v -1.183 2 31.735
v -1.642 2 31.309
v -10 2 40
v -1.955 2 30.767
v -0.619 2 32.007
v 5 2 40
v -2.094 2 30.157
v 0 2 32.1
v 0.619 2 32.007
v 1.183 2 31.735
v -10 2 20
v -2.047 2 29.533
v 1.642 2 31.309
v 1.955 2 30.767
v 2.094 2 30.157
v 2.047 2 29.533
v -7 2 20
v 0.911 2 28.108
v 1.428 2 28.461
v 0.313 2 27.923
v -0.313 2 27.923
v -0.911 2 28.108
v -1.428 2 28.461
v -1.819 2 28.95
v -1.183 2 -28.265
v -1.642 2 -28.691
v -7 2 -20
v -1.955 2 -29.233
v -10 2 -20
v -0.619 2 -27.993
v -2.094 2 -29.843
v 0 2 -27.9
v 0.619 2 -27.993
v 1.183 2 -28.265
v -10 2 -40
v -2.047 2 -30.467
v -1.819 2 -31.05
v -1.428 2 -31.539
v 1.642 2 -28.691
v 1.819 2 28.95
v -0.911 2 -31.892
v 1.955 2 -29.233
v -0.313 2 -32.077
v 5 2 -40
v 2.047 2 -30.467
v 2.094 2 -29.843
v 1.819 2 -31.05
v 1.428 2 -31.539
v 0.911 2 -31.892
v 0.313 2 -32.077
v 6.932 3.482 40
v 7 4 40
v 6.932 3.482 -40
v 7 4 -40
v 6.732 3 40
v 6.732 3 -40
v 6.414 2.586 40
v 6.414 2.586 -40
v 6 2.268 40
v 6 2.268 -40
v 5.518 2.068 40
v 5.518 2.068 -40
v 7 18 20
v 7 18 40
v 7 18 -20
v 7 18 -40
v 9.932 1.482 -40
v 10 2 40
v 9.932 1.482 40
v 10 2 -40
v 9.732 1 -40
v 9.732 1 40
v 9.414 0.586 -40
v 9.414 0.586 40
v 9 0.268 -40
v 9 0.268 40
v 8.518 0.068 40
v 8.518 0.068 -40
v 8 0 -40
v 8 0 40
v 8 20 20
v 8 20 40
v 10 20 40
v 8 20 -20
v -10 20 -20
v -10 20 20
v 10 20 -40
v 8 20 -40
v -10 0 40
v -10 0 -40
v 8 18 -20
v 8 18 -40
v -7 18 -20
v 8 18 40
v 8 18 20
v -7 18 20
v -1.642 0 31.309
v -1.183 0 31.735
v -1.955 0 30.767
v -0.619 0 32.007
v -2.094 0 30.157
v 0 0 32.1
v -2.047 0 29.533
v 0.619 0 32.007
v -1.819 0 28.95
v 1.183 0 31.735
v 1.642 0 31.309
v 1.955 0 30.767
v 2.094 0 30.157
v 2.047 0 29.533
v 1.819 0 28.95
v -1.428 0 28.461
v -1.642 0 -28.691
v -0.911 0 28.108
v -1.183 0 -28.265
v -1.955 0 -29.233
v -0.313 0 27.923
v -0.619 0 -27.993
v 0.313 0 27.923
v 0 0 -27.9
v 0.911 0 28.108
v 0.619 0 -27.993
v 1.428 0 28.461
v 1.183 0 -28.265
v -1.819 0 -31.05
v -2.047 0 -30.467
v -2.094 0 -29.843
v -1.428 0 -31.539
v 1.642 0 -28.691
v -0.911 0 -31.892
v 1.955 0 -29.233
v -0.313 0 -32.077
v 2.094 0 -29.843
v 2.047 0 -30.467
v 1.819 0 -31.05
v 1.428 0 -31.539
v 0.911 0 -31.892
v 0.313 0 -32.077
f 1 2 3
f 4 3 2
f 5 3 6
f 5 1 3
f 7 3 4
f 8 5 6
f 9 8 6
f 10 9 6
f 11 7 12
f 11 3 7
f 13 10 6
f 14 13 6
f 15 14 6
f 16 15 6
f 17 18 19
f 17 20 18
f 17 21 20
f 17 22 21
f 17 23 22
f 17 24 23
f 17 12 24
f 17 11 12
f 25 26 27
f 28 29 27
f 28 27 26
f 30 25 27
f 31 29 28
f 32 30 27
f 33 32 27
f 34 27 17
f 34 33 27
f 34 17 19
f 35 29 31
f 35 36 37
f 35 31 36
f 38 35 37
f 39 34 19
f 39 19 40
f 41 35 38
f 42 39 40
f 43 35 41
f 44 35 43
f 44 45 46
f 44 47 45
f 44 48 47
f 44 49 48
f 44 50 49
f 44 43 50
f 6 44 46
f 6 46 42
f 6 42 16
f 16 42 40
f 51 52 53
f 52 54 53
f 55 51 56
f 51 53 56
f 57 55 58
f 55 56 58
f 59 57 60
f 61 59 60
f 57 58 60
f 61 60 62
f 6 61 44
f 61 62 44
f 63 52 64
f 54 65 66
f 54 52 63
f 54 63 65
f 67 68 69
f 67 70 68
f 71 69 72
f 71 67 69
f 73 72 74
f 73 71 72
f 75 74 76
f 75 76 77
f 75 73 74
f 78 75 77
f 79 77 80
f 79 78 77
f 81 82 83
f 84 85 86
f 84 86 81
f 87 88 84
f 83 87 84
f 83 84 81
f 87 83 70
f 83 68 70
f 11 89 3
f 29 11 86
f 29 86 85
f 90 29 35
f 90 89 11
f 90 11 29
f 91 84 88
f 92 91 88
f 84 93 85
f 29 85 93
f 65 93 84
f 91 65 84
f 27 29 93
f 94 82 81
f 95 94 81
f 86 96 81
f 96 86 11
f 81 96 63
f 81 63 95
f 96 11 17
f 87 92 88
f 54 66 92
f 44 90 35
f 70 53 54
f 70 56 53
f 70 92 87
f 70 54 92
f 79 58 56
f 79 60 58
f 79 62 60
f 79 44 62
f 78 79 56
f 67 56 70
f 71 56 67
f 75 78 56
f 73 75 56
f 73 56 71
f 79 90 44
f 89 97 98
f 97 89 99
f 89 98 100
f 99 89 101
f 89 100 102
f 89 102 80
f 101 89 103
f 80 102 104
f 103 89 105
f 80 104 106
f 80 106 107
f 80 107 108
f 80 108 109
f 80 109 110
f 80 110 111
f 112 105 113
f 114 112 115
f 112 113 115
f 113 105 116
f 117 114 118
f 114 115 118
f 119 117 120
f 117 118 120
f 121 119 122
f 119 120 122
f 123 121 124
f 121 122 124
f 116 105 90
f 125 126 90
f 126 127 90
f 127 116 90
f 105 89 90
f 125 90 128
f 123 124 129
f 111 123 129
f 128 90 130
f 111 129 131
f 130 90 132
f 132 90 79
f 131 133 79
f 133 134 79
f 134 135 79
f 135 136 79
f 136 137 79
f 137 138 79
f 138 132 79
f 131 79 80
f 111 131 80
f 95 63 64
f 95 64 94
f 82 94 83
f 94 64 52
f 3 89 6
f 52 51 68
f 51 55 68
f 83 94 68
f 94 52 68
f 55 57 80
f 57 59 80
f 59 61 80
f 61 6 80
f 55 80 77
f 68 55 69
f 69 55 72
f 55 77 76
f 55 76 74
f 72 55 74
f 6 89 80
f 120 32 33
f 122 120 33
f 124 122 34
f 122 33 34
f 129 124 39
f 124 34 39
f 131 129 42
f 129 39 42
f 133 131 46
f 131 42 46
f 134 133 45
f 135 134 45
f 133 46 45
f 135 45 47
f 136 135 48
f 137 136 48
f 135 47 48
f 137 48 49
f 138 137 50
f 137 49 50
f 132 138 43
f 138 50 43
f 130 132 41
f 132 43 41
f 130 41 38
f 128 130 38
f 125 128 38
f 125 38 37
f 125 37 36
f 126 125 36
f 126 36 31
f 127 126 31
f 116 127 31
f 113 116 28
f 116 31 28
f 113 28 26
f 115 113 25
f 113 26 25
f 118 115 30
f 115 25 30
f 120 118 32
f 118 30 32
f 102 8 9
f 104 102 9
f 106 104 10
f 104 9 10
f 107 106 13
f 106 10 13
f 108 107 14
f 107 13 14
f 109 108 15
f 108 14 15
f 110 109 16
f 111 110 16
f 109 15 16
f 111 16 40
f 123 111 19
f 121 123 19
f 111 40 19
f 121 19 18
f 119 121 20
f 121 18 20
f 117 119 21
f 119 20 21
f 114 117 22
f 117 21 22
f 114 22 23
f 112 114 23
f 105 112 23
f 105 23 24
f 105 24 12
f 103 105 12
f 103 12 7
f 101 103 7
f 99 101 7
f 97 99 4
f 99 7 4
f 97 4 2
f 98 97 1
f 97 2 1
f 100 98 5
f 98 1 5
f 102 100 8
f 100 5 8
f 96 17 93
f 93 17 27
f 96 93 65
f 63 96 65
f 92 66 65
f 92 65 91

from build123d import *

# Parameters (mm, degrees)
CROQUIS1_W              = 20
CROQUIS1_H              = 80
SALIENTE_EXTRUIR1_DEPTH = 2
CROQUIS2_W              = 3
CROQUIS2_H              = 80
SALIENTE_EXTRUIR2_DEPTH = 16
REDONDEO1_R             = 2
REDONDEO2_R             = 2
CROQUIS3_W              = 20
CROQUIS3_H              = 80
SALIENTE_EXTRUIR3_DEPTH = 2
CROQUIS5_R              = 2.1
CORTAR_EXTRUIR1_DEPTH   = 2
CROQUIS6_W              = 18
CROQUIS6_H              = 20
CORTAR_EXTRUIR3_DEPTH   = 2
CROQUIS7_W              = 3
CROQUIS7_H              = 40
SALIENTE_EXTRUIR4_DEPTH = 16


with BuildPart() as part:
    # Croquis1 → Saliente-Extruir1 (new body)
    with BuildSketch(Plane(origin=(0, 0, 0), x_dir=(1, 0, 0), z_dir=(0, 1, 0))):
        Rectangle(CROQUIS1_W, CROQUIS1_H)
    extrude(amount=SALIENTE_EXTRUIR1_DEPTH)

    # Croquis2 → Saliente-Extruir2 (add)
    with BuildSketch(Plane(origin=(0, 2, 0), x_dir=(1, 0, 0), z_dir=(0, 1, 0))):
        with Locations((8.5, 0)):
            Rectangle(CROQUIS2_W, CROQUIS2_H)
    extrude(amount=SALIENTE_EXTRUIR2_DEPTH)

    # Redondeo1
    redondeo1_edges = [part.edges().sort_by_distance(p)[0] for p in [
        (10, 0, 0),
    ]]
    fillet(redondeo1_edges, radius=REDONDEO1_R)

    # Redondeo2
    redondeo2_edges = [part.edges().sort_by_distance(p)[0] for p in [
        (7, 2, 0),
    ]]
    fillet(redondeo2_edges, radius=REDONDEO2_R)

    # Croquis3 → Saliente-Extruir3 (add)
    with BuildSketch(Plane(origin=(0, 18, 0), x_dir=(1, 0, 0), z_dir=(0, 1, 0))):
        Rectangle(CROQUIS3_W, CROQUIS3_H)
    extrude(amount=SALIENTE_EXTRUIR3_DEPTH)

    # Croquis5 → Cortar-Extruir1 (cut)
    with BuildSketch(Plane(origin=(0, 2, 0), x_dir=(1, 0, 0), z_dir=(0, 1, 0))):
        with Locations(Location((0, 30, 0), (0, 0, 270))):
            Circle(CROQUIS5_R)
        with Locations(Location((0, -30, 0), (0, 0, 270))):
            Circle(CROQUIS5_R)
    extrude(amount=-CORTAR_EXTRUIR1_DEPTH, mode=Mode.SUBTRACT)

    # Croquis6 → Cortar-Extruir3 (cut)
    with BuildSketch(Plane(origin=(0, 20, 0), x_dir=(1, 0, 0), z_dir=(0, 1, 0))):
        with Locations((-1, 30)):
            Rectangle(CROQUIS6_W, CROQUIS6_H)
        with Locations((-1, -30)):
            Rectangle(CROQUIS6_W, CROQUIS6_H)
    extrude(amount=-CORTAR_EXTRUIR3_DEPTH, mode=Mode.SUBTRACT)

    # Croquis7 → Saliente-Extruir4 (add)
    with BuildSketch(Plane(origin=(0, 2, 0), x_dir=(1, 0, 0), z_dir=(0, 1, 0))):
        with Locations((-8.5, 0)):
            Rectangle(CROQUIS7_W, CROQUIS7_H)
    extrude(amount=SALIENTE_EXTRUIR4_DEPTH)


solid = part.part
